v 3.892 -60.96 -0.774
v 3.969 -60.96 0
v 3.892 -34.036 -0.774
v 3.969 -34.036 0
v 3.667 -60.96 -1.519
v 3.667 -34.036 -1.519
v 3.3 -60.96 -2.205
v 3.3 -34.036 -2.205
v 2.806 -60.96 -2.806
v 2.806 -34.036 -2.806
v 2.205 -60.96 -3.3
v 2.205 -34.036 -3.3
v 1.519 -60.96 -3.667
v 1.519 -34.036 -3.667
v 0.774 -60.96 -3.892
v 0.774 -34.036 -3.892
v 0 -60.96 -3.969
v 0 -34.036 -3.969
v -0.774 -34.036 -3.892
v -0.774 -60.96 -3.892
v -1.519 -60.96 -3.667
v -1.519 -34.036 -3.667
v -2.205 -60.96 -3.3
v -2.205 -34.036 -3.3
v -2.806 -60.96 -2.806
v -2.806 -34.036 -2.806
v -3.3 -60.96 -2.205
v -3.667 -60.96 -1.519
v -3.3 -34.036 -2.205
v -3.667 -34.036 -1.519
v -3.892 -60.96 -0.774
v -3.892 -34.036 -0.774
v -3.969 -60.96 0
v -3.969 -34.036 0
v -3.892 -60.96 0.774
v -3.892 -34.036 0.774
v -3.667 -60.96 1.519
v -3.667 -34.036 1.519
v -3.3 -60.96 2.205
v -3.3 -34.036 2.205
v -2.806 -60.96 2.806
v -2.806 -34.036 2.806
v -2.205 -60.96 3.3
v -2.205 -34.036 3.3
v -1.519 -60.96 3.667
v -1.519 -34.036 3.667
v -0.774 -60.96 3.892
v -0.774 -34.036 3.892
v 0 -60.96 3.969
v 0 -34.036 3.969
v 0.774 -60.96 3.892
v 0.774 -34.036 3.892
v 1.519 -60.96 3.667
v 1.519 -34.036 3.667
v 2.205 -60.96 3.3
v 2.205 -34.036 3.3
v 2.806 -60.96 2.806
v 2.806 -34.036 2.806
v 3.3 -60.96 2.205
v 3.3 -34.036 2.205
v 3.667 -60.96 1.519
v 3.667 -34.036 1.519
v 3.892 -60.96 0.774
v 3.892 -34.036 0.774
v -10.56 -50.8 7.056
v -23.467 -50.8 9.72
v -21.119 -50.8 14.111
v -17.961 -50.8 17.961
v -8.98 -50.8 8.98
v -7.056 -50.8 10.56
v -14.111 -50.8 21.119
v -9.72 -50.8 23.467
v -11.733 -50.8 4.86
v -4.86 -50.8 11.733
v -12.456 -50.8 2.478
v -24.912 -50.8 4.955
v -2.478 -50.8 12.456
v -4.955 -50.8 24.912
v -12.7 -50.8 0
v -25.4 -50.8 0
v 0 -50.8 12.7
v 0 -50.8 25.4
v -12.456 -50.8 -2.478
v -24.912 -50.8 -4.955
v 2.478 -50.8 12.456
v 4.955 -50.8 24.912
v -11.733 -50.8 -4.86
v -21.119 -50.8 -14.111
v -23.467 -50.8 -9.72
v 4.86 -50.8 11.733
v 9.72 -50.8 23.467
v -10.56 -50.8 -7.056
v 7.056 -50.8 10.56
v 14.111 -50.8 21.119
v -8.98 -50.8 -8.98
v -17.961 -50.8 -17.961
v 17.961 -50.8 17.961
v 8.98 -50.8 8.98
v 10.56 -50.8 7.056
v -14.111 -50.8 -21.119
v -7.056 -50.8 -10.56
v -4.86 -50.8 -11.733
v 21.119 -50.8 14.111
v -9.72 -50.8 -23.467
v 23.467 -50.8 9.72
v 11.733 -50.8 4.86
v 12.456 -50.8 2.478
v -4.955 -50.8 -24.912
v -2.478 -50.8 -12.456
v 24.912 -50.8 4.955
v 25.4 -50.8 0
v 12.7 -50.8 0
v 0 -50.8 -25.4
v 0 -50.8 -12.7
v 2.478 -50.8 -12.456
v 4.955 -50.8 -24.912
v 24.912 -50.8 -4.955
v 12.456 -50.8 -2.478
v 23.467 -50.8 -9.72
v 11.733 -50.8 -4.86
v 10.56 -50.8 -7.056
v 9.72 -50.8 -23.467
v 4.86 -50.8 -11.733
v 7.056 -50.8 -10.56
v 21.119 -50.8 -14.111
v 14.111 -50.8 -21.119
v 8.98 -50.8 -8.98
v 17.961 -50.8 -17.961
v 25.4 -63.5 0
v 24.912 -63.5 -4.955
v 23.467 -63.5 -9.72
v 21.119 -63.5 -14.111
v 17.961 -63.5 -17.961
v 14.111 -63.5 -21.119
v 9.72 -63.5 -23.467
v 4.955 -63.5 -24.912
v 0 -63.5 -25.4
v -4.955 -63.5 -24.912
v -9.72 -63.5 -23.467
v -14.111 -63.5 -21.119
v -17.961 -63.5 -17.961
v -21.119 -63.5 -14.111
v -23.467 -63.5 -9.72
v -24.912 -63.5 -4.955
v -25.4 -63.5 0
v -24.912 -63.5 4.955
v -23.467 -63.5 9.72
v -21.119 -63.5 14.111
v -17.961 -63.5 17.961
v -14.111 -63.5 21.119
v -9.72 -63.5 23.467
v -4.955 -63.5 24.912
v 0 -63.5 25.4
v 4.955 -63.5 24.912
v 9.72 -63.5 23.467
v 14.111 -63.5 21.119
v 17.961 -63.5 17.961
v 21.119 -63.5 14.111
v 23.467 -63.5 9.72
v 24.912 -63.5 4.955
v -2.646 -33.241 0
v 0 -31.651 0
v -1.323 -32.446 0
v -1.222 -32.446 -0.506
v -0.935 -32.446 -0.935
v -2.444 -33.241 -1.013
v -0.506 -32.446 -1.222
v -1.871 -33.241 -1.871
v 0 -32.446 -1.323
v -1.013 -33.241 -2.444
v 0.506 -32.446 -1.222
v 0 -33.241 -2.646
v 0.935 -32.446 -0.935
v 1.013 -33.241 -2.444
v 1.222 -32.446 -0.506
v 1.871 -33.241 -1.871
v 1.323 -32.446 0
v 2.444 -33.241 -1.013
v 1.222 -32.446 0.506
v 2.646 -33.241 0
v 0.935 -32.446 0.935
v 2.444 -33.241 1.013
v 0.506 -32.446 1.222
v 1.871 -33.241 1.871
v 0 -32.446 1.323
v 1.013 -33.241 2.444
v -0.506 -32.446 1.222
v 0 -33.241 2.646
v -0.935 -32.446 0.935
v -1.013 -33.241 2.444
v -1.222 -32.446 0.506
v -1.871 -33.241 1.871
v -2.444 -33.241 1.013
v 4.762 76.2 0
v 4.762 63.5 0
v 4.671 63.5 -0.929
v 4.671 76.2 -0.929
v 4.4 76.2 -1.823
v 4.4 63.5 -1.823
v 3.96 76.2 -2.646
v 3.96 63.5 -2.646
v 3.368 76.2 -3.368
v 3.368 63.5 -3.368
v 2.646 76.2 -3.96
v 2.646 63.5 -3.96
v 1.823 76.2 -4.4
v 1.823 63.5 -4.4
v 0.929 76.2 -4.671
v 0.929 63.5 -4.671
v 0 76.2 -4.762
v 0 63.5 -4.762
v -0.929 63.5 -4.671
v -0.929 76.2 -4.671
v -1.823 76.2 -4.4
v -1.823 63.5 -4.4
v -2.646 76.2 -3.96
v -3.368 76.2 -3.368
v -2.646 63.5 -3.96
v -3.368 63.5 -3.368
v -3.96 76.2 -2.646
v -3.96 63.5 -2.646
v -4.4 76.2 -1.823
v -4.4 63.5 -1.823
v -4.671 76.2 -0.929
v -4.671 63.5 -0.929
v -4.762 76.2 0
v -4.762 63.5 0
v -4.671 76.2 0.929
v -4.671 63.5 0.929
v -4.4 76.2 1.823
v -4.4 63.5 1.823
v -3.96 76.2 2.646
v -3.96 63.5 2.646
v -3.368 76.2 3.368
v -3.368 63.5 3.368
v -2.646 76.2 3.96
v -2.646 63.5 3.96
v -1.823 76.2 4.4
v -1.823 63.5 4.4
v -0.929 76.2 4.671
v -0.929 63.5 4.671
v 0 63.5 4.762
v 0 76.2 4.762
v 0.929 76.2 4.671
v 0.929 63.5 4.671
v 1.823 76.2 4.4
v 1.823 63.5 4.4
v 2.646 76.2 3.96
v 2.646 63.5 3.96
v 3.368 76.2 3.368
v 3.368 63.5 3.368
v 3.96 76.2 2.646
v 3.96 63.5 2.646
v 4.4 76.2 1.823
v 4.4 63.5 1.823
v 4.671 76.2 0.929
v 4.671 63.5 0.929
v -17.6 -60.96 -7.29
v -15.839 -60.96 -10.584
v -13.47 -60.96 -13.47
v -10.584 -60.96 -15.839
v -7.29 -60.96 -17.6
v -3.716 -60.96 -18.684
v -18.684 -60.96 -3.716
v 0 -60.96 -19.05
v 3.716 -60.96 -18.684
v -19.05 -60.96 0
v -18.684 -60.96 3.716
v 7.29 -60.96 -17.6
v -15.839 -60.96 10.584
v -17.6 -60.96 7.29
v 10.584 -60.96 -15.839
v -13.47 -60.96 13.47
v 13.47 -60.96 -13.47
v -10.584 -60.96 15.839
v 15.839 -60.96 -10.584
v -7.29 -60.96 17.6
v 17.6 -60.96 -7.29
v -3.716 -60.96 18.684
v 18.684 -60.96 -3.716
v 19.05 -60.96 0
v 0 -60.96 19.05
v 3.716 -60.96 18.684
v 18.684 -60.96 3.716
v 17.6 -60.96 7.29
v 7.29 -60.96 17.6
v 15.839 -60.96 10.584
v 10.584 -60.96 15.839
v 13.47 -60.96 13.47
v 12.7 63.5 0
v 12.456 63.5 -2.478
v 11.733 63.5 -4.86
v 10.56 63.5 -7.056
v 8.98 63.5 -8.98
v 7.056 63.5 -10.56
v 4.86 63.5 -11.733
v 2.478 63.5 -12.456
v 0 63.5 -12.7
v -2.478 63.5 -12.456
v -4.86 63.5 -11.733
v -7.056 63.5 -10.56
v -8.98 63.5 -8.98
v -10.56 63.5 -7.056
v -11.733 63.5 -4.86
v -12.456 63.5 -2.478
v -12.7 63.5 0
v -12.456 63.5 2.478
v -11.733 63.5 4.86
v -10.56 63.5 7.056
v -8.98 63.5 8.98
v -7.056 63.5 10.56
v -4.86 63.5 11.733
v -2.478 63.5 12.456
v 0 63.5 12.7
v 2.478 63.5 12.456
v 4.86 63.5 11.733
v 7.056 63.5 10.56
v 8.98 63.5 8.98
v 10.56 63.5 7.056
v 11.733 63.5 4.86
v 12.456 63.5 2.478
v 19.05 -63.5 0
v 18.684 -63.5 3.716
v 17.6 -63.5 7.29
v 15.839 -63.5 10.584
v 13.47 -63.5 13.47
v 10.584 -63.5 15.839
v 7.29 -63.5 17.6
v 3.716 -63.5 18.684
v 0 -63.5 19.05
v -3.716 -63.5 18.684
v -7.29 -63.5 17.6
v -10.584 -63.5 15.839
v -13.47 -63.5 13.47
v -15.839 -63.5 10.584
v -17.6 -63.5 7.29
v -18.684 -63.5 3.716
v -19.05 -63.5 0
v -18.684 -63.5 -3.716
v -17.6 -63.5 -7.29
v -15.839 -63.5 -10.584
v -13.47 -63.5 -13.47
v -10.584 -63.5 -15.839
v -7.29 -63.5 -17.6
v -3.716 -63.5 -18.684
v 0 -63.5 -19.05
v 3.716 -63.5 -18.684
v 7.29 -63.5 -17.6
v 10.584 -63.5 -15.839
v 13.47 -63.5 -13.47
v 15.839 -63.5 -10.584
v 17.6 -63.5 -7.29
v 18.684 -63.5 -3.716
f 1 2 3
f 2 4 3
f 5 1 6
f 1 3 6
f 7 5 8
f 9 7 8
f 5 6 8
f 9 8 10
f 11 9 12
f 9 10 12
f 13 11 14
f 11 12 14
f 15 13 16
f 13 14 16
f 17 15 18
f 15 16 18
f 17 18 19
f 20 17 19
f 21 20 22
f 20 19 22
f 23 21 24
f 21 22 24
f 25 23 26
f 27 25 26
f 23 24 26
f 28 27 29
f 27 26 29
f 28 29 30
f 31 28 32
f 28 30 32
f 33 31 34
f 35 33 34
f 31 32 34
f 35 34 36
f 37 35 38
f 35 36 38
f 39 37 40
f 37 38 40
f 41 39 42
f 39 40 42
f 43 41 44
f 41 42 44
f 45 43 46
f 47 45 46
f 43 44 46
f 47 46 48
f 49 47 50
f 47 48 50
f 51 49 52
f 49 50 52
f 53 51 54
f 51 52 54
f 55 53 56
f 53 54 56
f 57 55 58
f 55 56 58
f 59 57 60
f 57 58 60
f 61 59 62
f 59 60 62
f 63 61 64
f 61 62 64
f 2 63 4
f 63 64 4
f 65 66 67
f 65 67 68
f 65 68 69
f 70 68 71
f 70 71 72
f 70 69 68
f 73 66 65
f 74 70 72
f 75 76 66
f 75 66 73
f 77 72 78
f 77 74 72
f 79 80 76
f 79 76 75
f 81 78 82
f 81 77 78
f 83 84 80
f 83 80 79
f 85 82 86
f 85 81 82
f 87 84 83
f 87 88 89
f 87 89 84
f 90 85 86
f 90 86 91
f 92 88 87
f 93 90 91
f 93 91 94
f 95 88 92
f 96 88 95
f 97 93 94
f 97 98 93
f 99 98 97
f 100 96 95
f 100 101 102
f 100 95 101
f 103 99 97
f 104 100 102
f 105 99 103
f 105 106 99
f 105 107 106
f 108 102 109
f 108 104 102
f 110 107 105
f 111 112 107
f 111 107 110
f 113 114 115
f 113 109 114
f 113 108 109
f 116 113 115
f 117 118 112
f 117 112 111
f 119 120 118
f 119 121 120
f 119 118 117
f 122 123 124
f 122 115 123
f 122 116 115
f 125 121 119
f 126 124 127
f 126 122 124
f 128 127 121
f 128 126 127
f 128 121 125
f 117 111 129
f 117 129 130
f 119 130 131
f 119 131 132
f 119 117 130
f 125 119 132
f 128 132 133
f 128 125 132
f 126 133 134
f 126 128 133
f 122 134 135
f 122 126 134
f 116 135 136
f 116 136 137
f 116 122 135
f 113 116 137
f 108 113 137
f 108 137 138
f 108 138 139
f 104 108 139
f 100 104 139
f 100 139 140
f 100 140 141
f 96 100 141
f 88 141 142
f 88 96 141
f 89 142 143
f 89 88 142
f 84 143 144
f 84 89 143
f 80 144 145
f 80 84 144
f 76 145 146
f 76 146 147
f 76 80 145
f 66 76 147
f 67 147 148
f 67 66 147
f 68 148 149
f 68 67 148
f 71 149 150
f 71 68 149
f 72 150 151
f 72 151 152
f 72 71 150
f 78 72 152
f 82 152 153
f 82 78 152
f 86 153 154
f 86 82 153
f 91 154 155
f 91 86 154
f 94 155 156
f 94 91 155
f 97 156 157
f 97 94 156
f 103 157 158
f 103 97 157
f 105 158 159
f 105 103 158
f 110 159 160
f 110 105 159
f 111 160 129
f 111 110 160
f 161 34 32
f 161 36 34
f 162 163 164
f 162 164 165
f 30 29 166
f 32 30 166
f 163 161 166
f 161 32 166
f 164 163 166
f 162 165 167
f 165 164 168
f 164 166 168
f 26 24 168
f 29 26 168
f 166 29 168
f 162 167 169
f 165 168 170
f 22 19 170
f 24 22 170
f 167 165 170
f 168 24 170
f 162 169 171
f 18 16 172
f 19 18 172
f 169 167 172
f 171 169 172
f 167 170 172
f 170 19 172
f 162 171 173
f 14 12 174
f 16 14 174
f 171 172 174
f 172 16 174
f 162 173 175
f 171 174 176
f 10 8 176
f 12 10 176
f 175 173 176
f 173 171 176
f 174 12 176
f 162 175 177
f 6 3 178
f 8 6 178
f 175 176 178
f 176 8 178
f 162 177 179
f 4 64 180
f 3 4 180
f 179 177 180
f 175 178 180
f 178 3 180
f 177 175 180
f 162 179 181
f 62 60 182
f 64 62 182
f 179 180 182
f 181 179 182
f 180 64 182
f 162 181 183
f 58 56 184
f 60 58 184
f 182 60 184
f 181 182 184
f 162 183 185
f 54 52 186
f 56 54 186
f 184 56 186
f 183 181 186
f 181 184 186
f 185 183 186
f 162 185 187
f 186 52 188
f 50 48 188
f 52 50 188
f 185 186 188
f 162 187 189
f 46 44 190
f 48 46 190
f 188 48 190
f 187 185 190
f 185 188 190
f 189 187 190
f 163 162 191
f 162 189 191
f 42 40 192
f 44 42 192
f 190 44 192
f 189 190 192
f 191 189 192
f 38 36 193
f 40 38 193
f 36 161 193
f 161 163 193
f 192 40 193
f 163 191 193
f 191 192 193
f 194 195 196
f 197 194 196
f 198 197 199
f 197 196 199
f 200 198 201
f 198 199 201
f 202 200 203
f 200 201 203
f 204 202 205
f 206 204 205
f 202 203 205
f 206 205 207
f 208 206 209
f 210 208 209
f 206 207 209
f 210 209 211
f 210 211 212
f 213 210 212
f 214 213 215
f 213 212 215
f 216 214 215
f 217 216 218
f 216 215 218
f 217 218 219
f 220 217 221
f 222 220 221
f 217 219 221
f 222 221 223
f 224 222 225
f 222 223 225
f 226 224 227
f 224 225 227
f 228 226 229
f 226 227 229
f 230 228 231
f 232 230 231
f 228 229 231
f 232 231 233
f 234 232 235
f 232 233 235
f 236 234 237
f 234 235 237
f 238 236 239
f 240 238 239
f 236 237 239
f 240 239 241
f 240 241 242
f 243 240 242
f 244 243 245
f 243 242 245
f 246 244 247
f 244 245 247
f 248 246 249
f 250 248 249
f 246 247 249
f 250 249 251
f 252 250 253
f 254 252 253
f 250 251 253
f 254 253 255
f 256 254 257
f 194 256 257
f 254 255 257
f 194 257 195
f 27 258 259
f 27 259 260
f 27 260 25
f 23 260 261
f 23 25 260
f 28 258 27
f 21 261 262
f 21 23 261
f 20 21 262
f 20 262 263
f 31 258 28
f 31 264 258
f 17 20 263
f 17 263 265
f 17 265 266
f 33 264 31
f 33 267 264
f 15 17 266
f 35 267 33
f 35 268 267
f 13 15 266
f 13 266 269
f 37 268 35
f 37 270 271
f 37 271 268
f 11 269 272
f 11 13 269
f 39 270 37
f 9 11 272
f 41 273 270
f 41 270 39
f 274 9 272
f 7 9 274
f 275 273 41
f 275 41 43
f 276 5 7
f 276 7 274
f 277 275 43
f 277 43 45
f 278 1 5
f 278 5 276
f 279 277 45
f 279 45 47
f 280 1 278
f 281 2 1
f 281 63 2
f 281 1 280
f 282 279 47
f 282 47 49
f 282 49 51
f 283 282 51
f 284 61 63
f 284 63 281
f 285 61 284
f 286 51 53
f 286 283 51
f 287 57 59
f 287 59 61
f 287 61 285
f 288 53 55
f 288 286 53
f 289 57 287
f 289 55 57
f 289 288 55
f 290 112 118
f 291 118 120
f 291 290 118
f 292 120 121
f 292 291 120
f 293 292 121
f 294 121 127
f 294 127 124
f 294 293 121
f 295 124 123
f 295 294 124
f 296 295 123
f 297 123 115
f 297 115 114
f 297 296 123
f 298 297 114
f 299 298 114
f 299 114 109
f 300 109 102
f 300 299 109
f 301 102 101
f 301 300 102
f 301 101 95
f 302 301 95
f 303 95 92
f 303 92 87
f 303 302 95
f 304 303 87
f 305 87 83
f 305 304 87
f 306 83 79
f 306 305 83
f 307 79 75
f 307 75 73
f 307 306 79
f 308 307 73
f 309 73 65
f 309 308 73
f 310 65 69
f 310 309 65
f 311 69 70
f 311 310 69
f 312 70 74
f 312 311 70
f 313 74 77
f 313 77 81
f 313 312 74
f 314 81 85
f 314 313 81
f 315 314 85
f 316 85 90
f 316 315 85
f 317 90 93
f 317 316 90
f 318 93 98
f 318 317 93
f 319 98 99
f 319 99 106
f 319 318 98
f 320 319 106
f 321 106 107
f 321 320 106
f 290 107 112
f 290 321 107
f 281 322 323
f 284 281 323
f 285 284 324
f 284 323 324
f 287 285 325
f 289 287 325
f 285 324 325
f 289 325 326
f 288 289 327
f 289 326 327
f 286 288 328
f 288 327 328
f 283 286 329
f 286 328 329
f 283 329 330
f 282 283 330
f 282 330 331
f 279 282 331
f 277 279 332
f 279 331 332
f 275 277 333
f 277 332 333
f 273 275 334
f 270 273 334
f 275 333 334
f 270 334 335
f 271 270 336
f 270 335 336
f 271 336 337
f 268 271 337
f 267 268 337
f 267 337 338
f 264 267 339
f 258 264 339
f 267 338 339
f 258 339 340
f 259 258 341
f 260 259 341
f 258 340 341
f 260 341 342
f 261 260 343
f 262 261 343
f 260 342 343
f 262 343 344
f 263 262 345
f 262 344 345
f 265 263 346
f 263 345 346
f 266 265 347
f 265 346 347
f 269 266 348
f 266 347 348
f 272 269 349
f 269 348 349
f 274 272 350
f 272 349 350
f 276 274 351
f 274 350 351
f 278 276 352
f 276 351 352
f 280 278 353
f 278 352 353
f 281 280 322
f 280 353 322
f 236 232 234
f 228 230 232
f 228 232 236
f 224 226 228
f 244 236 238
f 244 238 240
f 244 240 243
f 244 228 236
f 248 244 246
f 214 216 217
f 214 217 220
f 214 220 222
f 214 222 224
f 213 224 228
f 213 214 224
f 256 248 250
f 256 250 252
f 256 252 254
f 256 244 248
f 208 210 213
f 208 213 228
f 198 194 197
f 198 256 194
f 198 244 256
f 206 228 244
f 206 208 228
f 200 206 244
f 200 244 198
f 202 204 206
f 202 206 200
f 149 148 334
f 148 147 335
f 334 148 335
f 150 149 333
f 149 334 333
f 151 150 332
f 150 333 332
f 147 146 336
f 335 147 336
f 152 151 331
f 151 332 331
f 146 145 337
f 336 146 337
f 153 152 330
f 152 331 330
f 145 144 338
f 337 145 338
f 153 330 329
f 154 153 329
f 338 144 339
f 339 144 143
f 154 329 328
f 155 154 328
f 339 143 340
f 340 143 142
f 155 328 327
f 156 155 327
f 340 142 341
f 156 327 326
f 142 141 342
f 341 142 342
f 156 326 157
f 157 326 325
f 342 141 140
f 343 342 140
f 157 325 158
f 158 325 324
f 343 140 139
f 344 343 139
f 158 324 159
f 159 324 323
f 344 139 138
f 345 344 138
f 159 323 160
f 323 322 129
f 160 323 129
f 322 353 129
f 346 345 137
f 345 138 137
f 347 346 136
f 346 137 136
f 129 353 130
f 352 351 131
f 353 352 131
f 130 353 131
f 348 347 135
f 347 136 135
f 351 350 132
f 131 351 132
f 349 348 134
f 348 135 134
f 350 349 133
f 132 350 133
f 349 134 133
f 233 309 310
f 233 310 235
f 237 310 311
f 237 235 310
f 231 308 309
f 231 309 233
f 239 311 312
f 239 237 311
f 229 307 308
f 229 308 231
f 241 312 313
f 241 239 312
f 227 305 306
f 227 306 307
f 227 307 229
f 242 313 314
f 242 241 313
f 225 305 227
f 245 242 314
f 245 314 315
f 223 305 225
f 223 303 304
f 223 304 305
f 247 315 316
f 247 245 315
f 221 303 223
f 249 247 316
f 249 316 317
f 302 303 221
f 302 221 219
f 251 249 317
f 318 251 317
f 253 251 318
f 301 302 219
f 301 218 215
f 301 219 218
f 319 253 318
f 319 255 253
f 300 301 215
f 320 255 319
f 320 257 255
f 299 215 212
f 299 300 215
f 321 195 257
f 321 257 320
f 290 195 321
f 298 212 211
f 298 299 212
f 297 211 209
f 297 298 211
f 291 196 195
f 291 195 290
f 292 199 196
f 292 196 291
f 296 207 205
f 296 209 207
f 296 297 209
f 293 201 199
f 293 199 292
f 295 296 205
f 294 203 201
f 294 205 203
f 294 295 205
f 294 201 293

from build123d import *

# Parameters (mm, degrees)
SKETCH1_R                   = 25.4
BOSS_EXTRUDE1_DEPTH         = 63.5
SKETCH2_R                   = 25.4
SKETCH2_R_2                 = 12.7
CUT_EXTRUDE1_DEPTH          = 114.3
SKETCH3_R                   = 4.7625
BOSS_EXTRUDE2_DEPTH         = 12.7
SKETCH4_R                   = 19.05
CUT_EXTRUDE2_DEPTH          = 2.54
F_3_8_16_TAPPED_HOLE1_D     = 7.9375
F_3_8_16_TAPPED_HOLE1_DEPTH = 26.924
F_3_8_16_TAPPED_HOLE1_TIP   = 2.384665582


with BuildPart() as part:
    # Sketch1 → Boss-Extrude1 (new body, symmetric)
    with BuildSketch(Plane(origin=(0, 0, 0), x_dir=(1, 0, 0), z_dir=(0, 1, 0))):
        Circle(SKETCH1_R)
    extrude(amount=BOSS_EXTRUDE1_DEPTH, both=True)

    # Sketch2 → Cut-Extrude1 (cut)
    with BuildSketch(Plane(origin=(0, 63.5, 0), x_dir=(1, 0, 0), z_dir=(0, 1, 0))):
        Circle(SKETCH2_R)
        Circle(SKETCH2_R_2, mode=Mode.SUBTRACT)
    extrude(amount=-CUT_EXTRUDE1_DEPTH, mode=Mode.SUBTRACT)

    # Sketch3 → Boss-Extrude2 (add)
    with BuildSketch(Plane(origin=(0, 63.5, 0), x_dir=(1, 0, 0), z_dir=(0, 1, 0))):
        Circle(SKETCH3_R)
    extrude(amount=BOSS_EXTRUDE2_DEPTH)

    # Sketch4 → Cut-Extrude2 (cut)
    with BuildSketch(Plane.XZ.offset(63.5)):
        Circle(SKETCH4_R)
    extrude(amount=-CUT_EXTRUDE2_DEPTH, mode=Mode.SUBTRACT)

    # 3/8-16 Tapped Hole1
    with Locations(Plane(origin=(0, -60.96, 0), x_dir=(-1, 0, 0), z_dir=(0, -1, 0))):
        with Locations((0, 0)):
            Hole(F_3_8_16_TAPPED_HOLE1_D / 2, depth=F_3_8_16_TAPPED_HOLE1_DEPTH)
            with Locations((0, 0, -(F_3_8_16_TAPPED_HOLE1_DEPTH + F_3_8_16_TAPPED_HOLE1_TIP / 2))):  # 118° drill point
                Cone(0, F_3_8_16_TAPPED_HOLE1_D / 2, F_3_8_16_TAPPED_HOLE1_TIP, mode=Mode.SUBTRACT)


solid = part.part
